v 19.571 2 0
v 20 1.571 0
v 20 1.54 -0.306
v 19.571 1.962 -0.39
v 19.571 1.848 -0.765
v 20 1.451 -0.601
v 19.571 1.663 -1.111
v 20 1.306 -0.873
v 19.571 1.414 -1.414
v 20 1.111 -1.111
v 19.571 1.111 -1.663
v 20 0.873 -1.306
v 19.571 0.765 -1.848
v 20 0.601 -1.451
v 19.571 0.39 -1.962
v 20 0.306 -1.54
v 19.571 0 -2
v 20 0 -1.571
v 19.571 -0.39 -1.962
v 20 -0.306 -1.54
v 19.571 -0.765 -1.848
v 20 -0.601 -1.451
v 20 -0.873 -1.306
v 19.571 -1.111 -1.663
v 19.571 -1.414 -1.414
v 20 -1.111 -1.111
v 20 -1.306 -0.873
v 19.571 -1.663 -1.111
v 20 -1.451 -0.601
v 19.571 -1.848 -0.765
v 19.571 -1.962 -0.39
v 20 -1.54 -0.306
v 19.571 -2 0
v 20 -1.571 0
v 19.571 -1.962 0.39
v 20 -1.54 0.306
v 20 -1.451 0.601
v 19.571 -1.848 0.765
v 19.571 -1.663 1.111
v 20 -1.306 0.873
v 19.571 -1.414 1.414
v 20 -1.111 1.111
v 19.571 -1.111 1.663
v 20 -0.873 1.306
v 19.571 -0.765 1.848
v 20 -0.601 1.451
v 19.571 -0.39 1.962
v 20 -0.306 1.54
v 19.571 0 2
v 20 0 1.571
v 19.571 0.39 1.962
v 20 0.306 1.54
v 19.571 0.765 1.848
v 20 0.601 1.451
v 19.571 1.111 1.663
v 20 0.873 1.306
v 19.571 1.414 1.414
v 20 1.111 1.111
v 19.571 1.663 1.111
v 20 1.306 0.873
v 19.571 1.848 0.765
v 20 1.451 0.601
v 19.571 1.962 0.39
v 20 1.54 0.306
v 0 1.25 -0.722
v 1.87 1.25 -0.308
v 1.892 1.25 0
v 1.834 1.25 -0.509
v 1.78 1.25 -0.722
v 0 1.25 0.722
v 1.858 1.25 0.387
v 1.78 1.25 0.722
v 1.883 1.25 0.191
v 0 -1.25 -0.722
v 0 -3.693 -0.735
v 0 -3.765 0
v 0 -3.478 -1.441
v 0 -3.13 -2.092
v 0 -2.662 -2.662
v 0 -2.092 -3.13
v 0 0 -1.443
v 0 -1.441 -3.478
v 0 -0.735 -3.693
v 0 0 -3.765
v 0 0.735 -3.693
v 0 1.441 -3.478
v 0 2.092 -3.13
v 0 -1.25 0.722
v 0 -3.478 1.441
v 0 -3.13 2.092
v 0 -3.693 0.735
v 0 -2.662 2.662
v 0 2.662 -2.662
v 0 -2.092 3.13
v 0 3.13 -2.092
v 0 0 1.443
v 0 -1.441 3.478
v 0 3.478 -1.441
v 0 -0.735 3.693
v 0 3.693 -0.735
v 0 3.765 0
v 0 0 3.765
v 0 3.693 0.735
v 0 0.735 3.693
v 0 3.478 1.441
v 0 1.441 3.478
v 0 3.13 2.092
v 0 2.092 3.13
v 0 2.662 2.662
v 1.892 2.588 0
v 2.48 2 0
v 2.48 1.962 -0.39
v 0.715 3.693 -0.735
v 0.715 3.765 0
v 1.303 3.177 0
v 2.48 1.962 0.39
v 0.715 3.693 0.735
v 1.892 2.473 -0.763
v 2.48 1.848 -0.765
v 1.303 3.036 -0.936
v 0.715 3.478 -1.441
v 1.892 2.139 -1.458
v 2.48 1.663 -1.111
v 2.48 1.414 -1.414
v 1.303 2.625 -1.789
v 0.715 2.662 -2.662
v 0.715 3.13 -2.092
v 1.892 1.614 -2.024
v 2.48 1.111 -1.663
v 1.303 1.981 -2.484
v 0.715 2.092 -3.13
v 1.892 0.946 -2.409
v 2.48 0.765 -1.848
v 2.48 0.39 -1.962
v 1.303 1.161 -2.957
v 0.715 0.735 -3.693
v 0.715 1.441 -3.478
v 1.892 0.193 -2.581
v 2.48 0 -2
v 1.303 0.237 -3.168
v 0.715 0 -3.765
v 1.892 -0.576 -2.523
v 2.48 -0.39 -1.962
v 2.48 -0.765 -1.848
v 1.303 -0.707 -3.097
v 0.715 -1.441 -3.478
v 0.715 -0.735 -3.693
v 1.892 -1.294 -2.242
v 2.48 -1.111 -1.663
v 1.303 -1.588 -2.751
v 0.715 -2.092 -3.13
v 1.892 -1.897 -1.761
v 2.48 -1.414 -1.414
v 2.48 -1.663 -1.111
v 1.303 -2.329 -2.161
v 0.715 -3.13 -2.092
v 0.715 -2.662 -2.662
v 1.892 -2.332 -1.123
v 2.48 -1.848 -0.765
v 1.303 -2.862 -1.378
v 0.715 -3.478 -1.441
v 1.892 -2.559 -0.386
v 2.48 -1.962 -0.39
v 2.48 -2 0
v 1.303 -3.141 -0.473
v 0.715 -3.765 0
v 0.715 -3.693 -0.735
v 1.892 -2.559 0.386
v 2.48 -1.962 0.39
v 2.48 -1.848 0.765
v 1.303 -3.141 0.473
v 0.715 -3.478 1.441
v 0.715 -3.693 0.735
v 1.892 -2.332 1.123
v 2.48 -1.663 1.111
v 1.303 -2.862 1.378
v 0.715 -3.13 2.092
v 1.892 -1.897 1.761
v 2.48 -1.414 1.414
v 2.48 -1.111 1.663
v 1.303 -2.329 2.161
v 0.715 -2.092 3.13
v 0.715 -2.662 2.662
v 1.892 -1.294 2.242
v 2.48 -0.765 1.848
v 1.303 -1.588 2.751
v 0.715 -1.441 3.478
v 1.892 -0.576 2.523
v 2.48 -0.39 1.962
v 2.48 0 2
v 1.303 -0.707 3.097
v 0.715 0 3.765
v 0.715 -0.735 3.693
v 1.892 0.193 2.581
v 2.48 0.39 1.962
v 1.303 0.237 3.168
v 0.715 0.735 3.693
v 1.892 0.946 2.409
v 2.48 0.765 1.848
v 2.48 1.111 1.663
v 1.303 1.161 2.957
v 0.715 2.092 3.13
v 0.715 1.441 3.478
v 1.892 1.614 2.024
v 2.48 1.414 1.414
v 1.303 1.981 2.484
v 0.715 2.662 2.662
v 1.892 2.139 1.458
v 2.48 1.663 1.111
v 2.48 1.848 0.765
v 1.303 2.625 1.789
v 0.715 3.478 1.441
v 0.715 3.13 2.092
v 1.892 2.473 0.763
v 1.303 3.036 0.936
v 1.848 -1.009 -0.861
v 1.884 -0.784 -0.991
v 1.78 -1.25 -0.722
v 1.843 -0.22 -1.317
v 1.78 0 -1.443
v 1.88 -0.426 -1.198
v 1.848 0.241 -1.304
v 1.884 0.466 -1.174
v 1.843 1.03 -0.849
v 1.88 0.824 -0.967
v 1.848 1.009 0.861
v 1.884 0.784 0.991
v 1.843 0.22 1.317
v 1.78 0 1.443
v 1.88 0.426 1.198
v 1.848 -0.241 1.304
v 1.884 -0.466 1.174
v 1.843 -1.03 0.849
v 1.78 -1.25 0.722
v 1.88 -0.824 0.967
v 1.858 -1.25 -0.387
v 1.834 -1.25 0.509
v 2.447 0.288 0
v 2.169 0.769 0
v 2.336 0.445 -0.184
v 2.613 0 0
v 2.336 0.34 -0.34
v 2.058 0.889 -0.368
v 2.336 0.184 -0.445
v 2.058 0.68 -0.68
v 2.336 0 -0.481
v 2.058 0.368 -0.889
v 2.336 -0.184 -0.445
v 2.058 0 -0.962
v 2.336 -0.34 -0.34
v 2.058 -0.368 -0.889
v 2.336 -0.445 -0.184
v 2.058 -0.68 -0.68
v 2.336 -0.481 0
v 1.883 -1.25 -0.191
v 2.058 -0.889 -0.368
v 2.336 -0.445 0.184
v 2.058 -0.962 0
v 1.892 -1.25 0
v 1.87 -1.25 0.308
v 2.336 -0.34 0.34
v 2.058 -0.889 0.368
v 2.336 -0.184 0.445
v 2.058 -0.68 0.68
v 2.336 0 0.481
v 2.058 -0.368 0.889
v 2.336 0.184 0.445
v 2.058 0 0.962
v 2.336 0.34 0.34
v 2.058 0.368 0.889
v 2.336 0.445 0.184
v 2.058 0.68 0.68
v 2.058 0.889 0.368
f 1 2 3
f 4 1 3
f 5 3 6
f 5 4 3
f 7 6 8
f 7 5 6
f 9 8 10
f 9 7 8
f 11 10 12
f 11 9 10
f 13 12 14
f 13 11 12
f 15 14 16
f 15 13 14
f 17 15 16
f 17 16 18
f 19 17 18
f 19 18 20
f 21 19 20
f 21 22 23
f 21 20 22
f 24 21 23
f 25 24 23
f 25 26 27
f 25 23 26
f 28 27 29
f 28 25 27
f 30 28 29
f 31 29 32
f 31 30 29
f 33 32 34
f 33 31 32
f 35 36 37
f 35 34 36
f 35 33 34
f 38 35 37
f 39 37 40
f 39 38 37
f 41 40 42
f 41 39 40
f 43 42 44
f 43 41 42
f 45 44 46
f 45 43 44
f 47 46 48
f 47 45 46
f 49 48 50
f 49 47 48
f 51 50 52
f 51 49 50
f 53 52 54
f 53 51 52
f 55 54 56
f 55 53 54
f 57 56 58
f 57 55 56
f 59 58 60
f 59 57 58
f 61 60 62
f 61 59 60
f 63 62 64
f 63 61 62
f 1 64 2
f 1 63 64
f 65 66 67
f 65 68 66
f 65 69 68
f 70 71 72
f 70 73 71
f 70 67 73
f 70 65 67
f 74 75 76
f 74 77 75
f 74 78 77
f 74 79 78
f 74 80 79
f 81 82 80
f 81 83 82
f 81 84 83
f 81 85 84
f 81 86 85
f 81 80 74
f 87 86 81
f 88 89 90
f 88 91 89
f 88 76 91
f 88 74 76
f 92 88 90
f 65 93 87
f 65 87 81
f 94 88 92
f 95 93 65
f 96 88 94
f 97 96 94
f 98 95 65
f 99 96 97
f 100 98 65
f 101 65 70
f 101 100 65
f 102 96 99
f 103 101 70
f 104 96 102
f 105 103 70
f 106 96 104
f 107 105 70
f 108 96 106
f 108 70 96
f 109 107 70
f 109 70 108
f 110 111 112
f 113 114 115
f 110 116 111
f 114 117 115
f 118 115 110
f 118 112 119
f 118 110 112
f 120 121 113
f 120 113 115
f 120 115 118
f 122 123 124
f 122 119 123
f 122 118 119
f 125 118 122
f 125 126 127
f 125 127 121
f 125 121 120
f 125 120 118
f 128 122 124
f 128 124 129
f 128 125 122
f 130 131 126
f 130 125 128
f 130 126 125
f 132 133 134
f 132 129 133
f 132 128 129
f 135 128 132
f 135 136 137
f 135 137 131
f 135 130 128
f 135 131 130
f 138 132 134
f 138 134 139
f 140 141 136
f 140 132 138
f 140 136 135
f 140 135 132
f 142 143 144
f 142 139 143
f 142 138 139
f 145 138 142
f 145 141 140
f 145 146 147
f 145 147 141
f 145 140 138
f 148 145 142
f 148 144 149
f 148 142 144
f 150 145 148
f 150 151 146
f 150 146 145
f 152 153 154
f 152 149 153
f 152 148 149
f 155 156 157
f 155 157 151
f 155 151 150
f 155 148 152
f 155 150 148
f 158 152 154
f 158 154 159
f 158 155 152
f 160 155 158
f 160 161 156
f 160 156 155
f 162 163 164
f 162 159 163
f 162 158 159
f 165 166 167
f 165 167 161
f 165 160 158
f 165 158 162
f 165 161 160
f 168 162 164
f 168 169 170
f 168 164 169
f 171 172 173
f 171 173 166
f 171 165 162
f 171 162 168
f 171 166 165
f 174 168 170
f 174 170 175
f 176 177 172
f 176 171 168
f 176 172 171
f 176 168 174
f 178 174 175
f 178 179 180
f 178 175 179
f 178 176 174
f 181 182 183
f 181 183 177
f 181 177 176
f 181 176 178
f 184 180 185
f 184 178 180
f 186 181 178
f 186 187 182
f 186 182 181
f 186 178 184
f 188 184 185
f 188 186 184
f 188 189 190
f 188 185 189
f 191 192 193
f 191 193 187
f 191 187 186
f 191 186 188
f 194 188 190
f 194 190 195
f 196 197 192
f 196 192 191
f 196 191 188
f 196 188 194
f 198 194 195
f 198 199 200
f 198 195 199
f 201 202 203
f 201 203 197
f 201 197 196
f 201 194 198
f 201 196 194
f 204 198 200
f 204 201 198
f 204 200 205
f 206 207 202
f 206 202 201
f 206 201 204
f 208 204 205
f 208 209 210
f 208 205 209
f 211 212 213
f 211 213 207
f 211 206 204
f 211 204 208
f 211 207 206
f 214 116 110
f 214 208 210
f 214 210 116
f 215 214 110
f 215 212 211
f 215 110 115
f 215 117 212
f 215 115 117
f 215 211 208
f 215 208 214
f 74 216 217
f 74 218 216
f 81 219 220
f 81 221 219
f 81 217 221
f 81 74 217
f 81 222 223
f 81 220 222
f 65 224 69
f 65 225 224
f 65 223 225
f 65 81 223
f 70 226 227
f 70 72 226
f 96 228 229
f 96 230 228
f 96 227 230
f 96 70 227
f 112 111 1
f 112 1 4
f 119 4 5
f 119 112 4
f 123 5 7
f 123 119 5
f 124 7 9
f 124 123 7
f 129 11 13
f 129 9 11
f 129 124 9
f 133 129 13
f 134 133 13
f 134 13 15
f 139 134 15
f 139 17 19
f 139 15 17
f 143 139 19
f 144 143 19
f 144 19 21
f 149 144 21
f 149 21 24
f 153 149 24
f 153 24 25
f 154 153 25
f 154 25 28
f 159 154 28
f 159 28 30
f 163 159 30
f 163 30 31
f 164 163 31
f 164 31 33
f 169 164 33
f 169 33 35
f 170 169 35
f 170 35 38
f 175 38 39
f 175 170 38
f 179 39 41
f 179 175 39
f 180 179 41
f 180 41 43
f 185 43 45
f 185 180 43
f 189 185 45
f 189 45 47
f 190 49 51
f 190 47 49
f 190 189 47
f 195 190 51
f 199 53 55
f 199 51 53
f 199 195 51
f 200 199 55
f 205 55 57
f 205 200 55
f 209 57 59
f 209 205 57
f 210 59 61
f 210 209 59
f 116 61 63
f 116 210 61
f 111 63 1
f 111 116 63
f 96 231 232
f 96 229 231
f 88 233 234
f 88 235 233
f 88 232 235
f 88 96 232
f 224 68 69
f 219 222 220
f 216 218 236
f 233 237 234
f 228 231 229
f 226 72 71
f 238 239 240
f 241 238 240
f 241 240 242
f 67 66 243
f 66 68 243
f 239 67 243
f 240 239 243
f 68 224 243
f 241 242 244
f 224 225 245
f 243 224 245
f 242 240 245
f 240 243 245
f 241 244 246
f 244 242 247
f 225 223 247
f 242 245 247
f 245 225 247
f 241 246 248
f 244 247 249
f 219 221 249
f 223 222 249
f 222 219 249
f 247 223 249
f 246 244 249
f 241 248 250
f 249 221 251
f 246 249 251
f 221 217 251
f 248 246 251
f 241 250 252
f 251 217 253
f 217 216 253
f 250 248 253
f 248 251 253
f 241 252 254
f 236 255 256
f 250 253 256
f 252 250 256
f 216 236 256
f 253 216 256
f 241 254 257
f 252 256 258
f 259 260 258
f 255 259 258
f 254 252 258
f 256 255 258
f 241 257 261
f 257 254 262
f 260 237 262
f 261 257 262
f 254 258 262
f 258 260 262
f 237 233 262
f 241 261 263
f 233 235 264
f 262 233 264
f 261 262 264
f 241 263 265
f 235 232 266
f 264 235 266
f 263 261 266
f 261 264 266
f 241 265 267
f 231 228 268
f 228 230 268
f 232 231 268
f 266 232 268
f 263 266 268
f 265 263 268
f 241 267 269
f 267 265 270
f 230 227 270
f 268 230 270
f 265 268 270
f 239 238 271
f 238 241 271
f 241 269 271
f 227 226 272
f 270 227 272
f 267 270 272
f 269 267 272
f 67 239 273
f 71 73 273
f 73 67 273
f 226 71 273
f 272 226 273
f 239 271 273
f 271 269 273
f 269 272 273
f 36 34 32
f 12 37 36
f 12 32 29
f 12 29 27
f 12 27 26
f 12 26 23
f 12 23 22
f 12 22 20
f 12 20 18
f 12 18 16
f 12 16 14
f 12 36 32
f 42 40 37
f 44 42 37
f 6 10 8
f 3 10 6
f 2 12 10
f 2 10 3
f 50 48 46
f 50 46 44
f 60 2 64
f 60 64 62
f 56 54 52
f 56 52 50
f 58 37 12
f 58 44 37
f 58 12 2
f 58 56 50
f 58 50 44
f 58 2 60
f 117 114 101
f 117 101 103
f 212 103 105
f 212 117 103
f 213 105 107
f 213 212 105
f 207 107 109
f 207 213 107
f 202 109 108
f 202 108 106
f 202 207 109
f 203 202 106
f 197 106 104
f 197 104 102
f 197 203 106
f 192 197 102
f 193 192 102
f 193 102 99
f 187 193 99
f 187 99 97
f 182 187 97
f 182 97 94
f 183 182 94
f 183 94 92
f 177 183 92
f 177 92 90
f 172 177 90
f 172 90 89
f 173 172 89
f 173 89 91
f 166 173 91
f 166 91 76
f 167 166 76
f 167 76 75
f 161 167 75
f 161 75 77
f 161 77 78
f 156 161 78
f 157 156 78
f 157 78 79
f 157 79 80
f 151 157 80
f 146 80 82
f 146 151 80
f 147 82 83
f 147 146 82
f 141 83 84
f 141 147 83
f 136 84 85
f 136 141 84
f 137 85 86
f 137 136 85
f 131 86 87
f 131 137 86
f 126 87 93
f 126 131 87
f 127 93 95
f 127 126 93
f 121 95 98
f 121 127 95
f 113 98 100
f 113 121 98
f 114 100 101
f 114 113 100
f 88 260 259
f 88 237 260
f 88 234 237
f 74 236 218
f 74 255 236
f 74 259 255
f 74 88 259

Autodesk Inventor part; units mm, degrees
ref_plane "YZ Plane" through (0, 0, 0) normal (1, 0, 0) x (0, 1, 0)
ref_plane "XZ Plane" through (0, 0, 0) normal (0, 1, 0) x (-1, 0, 0)
sketch "Sketch1" plane through (0, 0, 0) normal (0, 0, 1) x (1, 0, 0)
  line L0 (20, 0) -> (20, 2)
  line L1 (20, 2) -> (5, 2)
  line L2 (5, 2) -> (4.5706, 2)
  line L3 (0, 3.765) -> (0, 1.4434)
  line L4 (0, 1.4434) -> (1.78, 1.4434)
  line L5 (1.78, 1.4434) -> (2.6133, 0)
  line L6 (2.6133, 0) -> (20, 0)
  line L7 (0, 3.765) -> (0.715, 3.765)
  line L8 (0.715, 3.765) -> (2.48, 2)
  line L9 (4.5706, 2) -> (2.48, 2)
  line L10 (5, 2) -> (2.48, 2) construction
  line L11 (2.48, 2) -> (2.48, 2)
  line L12 (-4, 0) -> (24, 0) projected
  line L13 (0, -0.753) -> (0, 4.518) projected
  dimension "d0" = 20
  dimension "d1" = 15
  dimension "d2" = 1.78
  dimension "d3" = 4
  dimension "d6" = 2.48
  dimension "d7" = 45
  dimension "d8" = 2.8868
  dimension "d9" = 60
  dimension "d10" = 7.53
  dimension "d11" = 4
  dimension "d12" = 0.4294
revolve "Body" add sketch "Sketch1" angle 360 about axis through (2.6133, 0, 0) along (1, 0, 0) contours L6 L5 L4 L3 L7 L8 L9 L2 L1 L0
sketch "Sketch2" plane through (0, 0, 0) normal (-1, 0, 0) x (0, 0, 1)
  circle A0 centre (0, 0) radius 1.4434 projected
  line L0 (0, -5.271) -> (0, 5.271) projected
  line L1 (-5.271, 0) -> (5.271, 0) projected
  line L2 (1.4434, 0) -> (0.7217, -1.25)
  line L3 (0.7217, -1.25) -> (-0.7217, -1.25)
  line L4 (-0.7217, -1.25) -> (-1.4434, 0)
  line L5 (-1.4434, 0) -> (-0.7217, 1.25)
  line L6 (-0.7217, 1.25) -> (0.7217, 1.25)
  line L7 (0.7217, 1.25) -> (1.4434, 0)
  point P0 (0, 1.4434)
extrude "Slot" add sketch "Sketch2" against normal up to next contours L7 A0 | A0 L2 | L6 L0 A0 | A0 L0 L3 | L0 L6 A0 | A0 L3 L0 | L4 A0 | A0 L5
thread "Thread" size "M4x0.7" class "6g" standard "ISO Metric profile" length 15
chamfer "Chamfer1" distance 0.4294 distance2 0.4294 1 edges at (20, -2, 0) measured on face at (20, -0.7974, -0.7684)
ref_plane "Work Plane1" through (104.775, 0, 0) normal (0, 0, -1) x (1, 0, 0)
equation "\"d0\" = NLG"
equation "\"d1\" = GEL"
equation "\"d2\" = INTI"
equation "\"d3\" = GD"
equation "\"d6\" = KOH"
equation "\"d7\" = 0.5 * SEWI"
equation "\"d8\" = 1.1547 * SW"
equation "\"d10\" = KOD"
equation "\"d11\" = BDM"
equation "\"d12\" = GAL"
equation "\"d15\" = GEL"
equation "\"d17\" = -0.5 * SPD + 0.5 * GD"
equation "\"d18\" = GUL"
equation "\"NLG\" = 20"
equation "\"INTI\" = 1.78"
equation "\"GEL\" = 15"
equation "\"GAL\" = 0.61345 * PTC"
equation "\"KOH\" = 2.48"
equation "\"KOD\" = 7.53"
equation "\"GUL\" = 0.61345 * PTC"
equation "\"SPD\" = NND - 1.2269 * PTC"
equation "\"BDM\" = NND"
equation "\"GD\" = NND"
equation "\"SEWI\" = 90deg"
equation "\"SW\" = 2.5"
equation "\"TOA\" = 30deg"
equation "\"GD1\" = THREADDIA - 1.2269 * PTC"
equation "\"EPV\" = 4.48"
equation "\"THREADDIA\" = 4"
equation "\"PTC\" = 0.7"
equation "\"NND\" = 4"
equation "\"E0\" = 2.89"
equation "\"THREADDESC\" = 1.2345"
properties part number "451233010040020" material "Stainless Steel"
